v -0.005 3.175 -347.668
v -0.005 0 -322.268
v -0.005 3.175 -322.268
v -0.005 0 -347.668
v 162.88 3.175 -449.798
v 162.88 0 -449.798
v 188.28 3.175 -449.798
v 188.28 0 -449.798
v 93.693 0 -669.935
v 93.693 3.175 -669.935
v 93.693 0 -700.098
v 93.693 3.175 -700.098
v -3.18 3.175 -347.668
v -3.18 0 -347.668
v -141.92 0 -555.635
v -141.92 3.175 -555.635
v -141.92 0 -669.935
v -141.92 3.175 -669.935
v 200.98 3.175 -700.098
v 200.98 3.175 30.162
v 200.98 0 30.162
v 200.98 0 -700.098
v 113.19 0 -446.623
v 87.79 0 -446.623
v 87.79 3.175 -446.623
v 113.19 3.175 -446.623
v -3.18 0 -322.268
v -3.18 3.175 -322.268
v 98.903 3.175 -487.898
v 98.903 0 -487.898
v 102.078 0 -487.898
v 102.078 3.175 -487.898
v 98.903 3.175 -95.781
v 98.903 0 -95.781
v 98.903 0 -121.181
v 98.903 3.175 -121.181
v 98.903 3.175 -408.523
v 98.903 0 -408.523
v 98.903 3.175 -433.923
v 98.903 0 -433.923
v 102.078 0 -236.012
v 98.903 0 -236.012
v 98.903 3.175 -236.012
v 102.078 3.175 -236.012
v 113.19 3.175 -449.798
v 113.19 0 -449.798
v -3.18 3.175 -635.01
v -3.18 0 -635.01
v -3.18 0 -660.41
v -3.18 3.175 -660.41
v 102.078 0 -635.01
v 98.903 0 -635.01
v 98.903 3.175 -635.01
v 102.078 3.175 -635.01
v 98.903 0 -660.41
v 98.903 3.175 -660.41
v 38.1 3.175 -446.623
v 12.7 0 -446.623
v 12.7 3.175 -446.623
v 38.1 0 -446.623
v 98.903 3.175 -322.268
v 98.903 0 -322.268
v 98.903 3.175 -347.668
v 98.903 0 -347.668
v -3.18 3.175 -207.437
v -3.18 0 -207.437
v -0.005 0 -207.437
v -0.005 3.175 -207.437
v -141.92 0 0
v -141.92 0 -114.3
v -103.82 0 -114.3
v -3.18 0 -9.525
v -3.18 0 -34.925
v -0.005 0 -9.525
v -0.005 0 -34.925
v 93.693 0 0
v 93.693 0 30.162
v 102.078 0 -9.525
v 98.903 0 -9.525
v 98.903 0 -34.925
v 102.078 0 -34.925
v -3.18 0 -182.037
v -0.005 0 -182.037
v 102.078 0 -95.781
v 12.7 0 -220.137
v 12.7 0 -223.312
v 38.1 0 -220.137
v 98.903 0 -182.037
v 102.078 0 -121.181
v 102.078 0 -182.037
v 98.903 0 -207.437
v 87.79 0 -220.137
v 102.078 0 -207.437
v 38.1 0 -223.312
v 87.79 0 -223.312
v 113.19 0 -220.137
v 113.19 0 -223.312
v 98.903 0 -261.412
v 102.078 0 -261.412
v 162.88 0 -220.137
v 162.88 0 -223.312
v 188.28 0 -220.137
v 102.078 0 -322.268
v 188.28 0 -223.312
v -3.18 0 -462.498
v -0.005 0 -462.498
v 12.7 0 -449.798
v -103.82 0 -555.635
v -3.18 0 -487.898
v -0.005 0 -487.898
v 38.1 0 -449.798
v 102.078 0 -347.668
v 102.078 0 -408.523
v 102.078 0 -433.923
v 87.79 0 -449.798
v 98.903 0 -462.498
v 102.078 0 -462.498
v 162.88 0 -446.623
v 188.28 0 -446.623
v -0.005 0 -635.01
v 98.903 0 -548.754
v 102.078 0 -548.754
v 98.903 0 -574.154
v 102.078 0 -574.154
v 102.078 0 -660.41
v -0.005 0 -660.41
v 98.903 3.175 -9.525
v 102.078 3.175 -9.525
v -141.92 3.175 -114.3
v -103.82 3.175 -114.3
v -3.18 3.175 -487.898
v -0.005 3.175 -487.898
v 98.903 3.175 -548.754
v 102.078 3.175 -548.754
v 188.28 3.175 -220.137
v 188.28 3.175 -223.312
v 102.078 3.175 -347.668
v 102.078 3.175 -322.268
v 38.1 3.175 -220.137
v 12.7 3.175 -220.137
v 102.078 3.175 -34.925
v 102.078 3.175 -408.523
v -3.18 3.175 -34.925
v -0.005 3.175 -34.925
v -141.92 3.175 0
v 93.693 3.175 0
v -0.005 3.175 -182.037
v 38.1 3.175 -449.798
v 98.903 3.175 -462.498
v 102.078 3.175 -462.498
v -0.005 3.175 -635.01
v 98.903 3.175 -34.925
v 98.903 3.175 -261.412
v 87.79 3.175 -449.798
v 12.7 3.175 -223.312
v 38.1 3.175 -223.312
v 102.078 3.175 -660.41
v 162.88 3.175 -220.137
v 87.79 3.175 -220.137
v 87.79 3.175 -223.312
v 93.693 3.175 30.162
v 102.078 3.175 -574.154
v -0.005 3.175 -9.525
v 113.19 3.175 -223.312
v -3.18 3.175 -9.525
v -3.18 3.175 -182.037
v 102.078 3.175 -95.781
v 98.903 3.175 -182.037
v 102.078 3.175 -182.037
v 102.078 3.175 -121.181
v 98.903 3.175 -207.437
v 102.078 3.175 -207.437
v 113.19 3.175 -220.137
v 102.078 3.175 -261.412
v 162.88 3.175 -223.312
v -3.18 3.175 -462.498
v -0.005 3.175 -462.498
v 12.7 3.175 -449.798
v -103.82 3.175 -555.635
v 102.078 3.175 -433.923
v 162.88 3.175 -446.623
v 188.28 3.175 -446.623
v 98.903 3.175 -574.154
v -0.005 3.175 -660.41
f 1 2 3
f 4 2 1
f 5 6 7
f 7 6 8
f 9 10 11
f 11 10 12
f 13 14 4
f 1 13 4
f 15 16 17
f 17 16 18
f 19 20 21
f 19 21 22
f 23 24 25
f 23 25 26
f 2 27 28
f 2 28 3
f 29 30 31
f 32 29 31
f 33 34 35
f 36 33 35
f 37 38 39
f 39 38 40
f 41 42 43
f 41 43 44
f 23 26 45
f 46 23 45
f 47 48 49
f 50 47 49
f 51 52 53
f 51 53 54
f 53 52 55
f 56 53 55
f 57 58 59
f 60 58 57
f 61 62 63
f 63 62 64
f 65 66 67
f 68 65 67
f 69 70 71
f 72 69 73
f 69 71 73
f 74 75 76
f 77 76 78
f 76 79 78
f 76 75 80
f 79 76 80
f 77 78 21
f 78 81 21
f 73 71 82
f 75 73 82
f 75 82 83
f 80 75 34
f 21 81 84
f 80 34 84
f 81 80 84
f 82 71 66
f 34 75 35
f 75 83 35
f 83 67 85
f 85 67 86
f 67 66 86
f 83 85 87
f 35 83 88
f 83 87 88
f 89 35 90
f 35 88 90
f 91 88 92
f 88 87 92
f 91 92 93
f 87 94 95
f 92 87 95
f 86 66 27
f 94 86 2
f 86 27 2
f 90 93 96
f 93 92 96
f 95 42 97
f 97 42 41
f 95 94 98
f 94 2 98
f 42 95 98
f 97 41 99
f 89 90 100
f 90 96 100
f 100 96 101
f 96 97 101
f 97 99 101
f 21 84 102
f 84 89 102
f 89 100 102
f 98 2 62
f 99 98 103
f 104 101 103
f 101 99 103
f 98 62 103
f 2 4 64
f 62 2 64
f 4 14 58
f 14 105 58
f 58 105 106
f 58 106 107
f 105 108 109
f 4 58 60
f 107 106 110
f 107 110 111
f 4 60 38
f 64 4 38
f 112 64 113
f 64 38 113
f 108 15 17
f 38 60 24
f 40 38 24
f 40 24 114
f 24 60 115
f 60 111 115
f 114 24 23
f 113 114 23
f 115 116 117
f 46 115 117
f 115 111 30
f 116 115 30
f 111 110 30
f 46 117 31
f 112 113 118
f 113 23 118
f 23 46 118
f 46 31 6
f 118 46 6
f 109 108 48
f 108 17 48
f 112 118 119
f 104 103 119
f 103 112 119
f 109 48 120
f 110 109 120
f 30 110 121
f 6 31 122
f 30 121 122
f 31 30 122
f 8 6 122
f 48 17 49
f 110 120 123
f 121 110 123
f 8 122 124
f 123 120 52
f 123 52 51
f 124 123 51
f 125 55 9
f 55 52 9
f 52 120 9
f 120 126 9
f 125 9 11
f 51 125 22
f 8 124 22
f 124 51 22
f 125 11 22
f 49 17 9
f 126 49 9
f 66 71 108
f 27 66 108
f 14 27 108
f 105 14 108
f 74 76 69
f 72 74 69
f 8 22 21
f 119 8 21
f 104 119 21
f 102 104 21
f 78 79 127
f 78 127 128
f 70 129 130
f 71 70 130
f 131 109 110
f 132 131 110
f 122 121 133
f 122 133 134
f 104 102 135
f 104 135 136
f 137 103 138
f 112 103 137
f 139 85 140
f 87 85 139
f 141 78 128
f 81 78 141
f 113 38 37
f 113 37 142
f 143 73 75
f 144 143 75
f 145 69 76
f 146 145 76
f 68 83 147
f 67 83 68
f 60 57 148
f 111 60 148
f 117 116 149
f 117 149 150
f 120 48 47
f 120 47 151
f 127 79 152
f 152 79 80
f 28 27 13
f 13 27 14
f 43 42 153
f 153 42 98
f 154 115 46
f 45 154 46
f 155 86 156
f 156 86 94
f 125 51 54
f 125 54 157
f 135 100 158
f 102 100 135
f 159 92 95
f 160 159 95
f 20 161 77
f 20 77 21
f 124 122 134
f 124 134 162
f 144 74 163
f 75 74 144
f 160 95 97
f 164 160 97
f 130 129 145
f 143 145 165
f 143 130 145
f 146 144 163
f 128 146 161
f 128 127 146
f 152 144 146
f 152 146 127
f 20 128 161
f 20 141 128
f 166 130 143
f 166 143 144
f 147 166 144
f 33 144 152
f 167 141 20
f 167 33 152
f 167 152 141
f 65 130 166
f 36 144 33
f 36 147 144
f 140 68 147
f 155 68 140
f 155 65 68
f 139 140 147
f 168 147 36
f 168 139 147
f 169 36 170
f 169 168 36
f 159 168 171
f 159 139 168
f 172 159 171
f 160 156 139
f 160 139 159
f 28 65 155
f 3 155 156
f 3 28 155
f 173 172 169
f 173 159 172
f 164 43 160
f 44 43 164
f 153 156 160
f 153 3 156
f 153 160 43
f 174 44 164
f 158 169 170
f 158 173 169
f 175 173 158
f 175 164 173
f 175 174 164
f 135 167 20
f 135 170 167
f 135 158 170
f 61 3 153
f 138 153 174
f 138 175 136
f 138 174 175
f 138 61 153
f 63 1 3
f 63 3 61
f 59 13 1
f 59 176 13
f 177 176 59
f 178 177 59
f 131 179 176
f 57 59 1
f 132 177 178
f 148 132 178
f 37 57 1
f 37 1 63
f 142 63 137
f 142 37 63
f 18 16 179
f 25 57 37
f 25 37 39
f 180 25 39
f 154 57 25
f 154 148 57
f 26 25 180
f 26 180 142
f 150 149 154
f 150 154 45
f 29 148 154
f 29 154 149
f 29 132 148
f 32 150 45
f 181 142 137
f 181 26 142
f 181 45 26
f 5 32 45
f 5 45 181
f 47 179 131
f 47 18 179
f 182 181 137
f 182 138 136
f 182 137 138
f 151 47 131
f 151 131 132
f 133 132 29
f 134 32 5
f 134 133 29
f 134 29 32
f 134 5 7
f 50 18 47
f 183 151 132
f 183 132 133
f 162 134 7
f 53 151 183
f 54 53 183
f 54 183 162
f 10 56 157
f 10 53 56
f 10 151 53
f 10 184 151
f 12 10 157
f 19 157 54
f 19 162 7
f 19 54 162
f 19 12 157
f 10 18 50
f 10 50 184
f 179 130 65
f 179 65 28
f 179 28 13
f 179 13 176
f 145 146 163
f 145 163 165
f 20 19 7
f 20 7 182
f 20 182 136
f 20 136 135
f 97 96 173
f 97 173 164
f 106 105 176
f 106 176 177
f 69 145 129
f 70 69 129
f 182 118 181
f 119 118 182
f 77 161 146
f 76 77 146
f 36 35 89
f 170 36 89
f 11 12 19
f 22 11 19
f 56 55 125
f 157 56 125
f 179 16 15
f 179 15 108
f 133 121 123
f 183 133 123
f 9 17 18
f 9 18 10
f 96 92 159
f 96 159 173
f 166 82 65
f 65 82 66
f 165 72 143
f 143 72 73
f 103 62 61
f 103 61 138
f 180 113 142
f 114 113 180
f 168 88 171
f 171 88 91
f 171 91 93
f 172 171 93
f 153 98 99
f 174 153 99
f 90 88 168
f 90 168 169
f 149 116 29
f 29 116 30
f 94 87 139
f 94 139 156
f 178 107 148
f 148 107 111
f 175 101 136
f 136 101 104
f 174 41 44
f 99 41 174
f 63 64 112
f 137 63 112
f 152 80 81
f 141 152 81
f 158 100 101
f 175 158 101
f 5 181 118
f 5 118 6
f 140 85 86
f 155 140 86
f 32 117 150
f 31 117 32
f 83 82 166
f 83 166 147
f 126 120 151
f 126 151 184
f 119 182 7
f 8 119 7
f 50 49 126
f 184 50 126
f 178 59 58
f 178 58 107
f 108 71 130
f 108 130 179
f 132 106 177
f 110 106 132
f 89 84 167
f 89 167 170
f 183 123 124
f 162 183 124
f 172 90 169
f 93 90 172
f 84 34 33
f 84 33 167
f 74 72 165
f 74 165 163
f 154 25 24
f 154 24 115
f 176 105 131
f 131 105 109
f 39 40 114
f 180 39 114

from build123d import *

# Parameters (mm, degrees)
SKETCH3_W           = 304.8
SKETCH3_H           = 669.93516
SKETCH3_W_2         = 25.4
SKETCH3_H_2         = 3.175
SKETCH3_W_3         = 3.175
SKETCH3_H_3         = 25.4
BOSS_EXTRUDE1_DEPTH = 3.175
SKETCH6_W           = 107.287119944
SKETCH6_H           = 30.1625
SKETCH6_W_2         = 38.1
SKETCH6_H_2         = 114.3
BOSS_EXTRUDE2_DEPTH = 3.175


with BuildPart() as part:
    # Sketch3 → Boss-Extrude1 (new body)
    with BuildSketch(Plane(origin=(0, 0, 0), x_dir=(1, 0, 0), z_dir=(0, 1, 0))):
        with Locations((48.58004, 334.96758)):
            Rectangle(SKETCH3_W, SKETCH3_H)
        with Locations((25.4, 448.21094)):
            Rectangle(SKETCH3_W_2, SKETCH3_H_2, mode=Mode.SUBTRACT)
        with Locations((175.58004, 448.21094)):
            Rectangle(SKETCH3_W_2, SKETCH3_H_2, mode=Mode.SUBTRACT)
        with Locations((100.49002, 448.21094)):
            Rectangle(SKETCH3_W_2, SKETCH3_H_2, mode=Mode.SUBTRACT)
        with Locations((100.49002, 647.71016)):
            Rectangle(SKETCH3_W_3, SKETCH3_H_3, mode=Mode.SUBTRACT)
        with Locations((100.49002, 475.19844)):
            Rectangle(SKETCH3_W_3, SKETCH3_H_3, mode=Mode.SUBTRACT)
        with Locations((100.49002, 561.4543)):
            Rectangle(SKETCH3_W_3, SKETCH3_H_3, mode=Mode.SUBTRACT)
        with Locations((100.49002, 421.22344)):
            Rectangle(SKETCH3_W_3, SKETCH3_H_3, mode=Mode.SUBTRACT)
        with Locations((100.49002, 334.96758)):
            Rectangle(SKETCH3_W_3, SKETCH3_H_3, mode=Mode.SUBTRACT)
        with Locations((100.49002, 248.71172)):
            Rectangle(SKETCH3_W_3, SKETCH3_H_3, mode=Mode.SUBTRACT)
        with Locations((25.4, 221.72422)):
            Rectangle(SKETCH3_W_2, SKETCH3_H_2, mode=Mode.SUBTRACT)
        with Locations((100.49002, 221.72422)):
            Rectangle(SKETCH3_W_2, SKETCH3_H_2, mode=Mode.SUBTRACT)
        with Locations((175.58004, 221.72422)):
            Rectangle(SKETCH3_W_2, SKETCH3_H_2, mode=Mode.SUBTRACT)
        with Locations((100.49002, 22.225)):
            Rectangle(SKETCH3_W_3, SKETCH3_H_3, mode=Mode.SUBTRACT)
        with Locations((100.49002, 108.48086)):
            Rectangle(SKETCH3_W_3, SKETCH3_H_3, mode=Mode.SUBTRACT)
        with Locations((100.49002, 194.73672)):
            Rectangle(SKETCH3_W_3, SKETCH3_H_3, mode=Mode.SUBTRACT)
        with Locations((-1.59258, 647.71016)):
            Rectangle(SKETCH3_W_3, SKETCH3_H_3, mode=Mode.SUBTRACT)
        with Locations((-1.59258, 475.19844)):
            Rectangle(SKETCH3_W_3, SKETCH3_H_3, mode=Mode.SUBTRACT)
        with Locations((-1.59258, 334.96758)):
            Rectangle(SKETCH3_W_3, SKETCH3_H_3, mode=Mode.SUBTRACT)
        with Locations((-1.59258, 194.73672)):
            Rectangle(SKETCH3_W_3, SKETCH3_H_3, mode=Mode.SUBTRACT)
        with Locations((-1.59258, 22.225)):
            Rectangle(SKETCH3_W_3, SKETCH3_H_3, mode=Mode.SUBTRACT)
    extrude(amount=BOSS_EXTRUDE1_DEPTH)

    # Sketch6 → Boss-Extrude2 (add)
    with BuildSketch(Plane(origin=(0, 3.175, 0), x_dir=(1, 0, 0), z_dir=(0, 1, 0))):
        with Locations((147.336480028, 685.01641)):
            Rectangle(SKETCH6_W, SKETCH6_H)
        with Locations((147.336480028, -15.08125)):
            Rectangle(SKETCH6_W, SKETCH6_H)
        with Locations((-122.86996, 612.78516)):
            Rectangle(SKETCH6_W_2, SKETCH6_H_2)
        with Locations((-122.86996, 57.15)):
            Rectangle(SKETCH6_W_2, SKETCH6_H_2)
    extrude(amount=-BOSS_EXTRUDE2_DEPTH)


solid = part.part
